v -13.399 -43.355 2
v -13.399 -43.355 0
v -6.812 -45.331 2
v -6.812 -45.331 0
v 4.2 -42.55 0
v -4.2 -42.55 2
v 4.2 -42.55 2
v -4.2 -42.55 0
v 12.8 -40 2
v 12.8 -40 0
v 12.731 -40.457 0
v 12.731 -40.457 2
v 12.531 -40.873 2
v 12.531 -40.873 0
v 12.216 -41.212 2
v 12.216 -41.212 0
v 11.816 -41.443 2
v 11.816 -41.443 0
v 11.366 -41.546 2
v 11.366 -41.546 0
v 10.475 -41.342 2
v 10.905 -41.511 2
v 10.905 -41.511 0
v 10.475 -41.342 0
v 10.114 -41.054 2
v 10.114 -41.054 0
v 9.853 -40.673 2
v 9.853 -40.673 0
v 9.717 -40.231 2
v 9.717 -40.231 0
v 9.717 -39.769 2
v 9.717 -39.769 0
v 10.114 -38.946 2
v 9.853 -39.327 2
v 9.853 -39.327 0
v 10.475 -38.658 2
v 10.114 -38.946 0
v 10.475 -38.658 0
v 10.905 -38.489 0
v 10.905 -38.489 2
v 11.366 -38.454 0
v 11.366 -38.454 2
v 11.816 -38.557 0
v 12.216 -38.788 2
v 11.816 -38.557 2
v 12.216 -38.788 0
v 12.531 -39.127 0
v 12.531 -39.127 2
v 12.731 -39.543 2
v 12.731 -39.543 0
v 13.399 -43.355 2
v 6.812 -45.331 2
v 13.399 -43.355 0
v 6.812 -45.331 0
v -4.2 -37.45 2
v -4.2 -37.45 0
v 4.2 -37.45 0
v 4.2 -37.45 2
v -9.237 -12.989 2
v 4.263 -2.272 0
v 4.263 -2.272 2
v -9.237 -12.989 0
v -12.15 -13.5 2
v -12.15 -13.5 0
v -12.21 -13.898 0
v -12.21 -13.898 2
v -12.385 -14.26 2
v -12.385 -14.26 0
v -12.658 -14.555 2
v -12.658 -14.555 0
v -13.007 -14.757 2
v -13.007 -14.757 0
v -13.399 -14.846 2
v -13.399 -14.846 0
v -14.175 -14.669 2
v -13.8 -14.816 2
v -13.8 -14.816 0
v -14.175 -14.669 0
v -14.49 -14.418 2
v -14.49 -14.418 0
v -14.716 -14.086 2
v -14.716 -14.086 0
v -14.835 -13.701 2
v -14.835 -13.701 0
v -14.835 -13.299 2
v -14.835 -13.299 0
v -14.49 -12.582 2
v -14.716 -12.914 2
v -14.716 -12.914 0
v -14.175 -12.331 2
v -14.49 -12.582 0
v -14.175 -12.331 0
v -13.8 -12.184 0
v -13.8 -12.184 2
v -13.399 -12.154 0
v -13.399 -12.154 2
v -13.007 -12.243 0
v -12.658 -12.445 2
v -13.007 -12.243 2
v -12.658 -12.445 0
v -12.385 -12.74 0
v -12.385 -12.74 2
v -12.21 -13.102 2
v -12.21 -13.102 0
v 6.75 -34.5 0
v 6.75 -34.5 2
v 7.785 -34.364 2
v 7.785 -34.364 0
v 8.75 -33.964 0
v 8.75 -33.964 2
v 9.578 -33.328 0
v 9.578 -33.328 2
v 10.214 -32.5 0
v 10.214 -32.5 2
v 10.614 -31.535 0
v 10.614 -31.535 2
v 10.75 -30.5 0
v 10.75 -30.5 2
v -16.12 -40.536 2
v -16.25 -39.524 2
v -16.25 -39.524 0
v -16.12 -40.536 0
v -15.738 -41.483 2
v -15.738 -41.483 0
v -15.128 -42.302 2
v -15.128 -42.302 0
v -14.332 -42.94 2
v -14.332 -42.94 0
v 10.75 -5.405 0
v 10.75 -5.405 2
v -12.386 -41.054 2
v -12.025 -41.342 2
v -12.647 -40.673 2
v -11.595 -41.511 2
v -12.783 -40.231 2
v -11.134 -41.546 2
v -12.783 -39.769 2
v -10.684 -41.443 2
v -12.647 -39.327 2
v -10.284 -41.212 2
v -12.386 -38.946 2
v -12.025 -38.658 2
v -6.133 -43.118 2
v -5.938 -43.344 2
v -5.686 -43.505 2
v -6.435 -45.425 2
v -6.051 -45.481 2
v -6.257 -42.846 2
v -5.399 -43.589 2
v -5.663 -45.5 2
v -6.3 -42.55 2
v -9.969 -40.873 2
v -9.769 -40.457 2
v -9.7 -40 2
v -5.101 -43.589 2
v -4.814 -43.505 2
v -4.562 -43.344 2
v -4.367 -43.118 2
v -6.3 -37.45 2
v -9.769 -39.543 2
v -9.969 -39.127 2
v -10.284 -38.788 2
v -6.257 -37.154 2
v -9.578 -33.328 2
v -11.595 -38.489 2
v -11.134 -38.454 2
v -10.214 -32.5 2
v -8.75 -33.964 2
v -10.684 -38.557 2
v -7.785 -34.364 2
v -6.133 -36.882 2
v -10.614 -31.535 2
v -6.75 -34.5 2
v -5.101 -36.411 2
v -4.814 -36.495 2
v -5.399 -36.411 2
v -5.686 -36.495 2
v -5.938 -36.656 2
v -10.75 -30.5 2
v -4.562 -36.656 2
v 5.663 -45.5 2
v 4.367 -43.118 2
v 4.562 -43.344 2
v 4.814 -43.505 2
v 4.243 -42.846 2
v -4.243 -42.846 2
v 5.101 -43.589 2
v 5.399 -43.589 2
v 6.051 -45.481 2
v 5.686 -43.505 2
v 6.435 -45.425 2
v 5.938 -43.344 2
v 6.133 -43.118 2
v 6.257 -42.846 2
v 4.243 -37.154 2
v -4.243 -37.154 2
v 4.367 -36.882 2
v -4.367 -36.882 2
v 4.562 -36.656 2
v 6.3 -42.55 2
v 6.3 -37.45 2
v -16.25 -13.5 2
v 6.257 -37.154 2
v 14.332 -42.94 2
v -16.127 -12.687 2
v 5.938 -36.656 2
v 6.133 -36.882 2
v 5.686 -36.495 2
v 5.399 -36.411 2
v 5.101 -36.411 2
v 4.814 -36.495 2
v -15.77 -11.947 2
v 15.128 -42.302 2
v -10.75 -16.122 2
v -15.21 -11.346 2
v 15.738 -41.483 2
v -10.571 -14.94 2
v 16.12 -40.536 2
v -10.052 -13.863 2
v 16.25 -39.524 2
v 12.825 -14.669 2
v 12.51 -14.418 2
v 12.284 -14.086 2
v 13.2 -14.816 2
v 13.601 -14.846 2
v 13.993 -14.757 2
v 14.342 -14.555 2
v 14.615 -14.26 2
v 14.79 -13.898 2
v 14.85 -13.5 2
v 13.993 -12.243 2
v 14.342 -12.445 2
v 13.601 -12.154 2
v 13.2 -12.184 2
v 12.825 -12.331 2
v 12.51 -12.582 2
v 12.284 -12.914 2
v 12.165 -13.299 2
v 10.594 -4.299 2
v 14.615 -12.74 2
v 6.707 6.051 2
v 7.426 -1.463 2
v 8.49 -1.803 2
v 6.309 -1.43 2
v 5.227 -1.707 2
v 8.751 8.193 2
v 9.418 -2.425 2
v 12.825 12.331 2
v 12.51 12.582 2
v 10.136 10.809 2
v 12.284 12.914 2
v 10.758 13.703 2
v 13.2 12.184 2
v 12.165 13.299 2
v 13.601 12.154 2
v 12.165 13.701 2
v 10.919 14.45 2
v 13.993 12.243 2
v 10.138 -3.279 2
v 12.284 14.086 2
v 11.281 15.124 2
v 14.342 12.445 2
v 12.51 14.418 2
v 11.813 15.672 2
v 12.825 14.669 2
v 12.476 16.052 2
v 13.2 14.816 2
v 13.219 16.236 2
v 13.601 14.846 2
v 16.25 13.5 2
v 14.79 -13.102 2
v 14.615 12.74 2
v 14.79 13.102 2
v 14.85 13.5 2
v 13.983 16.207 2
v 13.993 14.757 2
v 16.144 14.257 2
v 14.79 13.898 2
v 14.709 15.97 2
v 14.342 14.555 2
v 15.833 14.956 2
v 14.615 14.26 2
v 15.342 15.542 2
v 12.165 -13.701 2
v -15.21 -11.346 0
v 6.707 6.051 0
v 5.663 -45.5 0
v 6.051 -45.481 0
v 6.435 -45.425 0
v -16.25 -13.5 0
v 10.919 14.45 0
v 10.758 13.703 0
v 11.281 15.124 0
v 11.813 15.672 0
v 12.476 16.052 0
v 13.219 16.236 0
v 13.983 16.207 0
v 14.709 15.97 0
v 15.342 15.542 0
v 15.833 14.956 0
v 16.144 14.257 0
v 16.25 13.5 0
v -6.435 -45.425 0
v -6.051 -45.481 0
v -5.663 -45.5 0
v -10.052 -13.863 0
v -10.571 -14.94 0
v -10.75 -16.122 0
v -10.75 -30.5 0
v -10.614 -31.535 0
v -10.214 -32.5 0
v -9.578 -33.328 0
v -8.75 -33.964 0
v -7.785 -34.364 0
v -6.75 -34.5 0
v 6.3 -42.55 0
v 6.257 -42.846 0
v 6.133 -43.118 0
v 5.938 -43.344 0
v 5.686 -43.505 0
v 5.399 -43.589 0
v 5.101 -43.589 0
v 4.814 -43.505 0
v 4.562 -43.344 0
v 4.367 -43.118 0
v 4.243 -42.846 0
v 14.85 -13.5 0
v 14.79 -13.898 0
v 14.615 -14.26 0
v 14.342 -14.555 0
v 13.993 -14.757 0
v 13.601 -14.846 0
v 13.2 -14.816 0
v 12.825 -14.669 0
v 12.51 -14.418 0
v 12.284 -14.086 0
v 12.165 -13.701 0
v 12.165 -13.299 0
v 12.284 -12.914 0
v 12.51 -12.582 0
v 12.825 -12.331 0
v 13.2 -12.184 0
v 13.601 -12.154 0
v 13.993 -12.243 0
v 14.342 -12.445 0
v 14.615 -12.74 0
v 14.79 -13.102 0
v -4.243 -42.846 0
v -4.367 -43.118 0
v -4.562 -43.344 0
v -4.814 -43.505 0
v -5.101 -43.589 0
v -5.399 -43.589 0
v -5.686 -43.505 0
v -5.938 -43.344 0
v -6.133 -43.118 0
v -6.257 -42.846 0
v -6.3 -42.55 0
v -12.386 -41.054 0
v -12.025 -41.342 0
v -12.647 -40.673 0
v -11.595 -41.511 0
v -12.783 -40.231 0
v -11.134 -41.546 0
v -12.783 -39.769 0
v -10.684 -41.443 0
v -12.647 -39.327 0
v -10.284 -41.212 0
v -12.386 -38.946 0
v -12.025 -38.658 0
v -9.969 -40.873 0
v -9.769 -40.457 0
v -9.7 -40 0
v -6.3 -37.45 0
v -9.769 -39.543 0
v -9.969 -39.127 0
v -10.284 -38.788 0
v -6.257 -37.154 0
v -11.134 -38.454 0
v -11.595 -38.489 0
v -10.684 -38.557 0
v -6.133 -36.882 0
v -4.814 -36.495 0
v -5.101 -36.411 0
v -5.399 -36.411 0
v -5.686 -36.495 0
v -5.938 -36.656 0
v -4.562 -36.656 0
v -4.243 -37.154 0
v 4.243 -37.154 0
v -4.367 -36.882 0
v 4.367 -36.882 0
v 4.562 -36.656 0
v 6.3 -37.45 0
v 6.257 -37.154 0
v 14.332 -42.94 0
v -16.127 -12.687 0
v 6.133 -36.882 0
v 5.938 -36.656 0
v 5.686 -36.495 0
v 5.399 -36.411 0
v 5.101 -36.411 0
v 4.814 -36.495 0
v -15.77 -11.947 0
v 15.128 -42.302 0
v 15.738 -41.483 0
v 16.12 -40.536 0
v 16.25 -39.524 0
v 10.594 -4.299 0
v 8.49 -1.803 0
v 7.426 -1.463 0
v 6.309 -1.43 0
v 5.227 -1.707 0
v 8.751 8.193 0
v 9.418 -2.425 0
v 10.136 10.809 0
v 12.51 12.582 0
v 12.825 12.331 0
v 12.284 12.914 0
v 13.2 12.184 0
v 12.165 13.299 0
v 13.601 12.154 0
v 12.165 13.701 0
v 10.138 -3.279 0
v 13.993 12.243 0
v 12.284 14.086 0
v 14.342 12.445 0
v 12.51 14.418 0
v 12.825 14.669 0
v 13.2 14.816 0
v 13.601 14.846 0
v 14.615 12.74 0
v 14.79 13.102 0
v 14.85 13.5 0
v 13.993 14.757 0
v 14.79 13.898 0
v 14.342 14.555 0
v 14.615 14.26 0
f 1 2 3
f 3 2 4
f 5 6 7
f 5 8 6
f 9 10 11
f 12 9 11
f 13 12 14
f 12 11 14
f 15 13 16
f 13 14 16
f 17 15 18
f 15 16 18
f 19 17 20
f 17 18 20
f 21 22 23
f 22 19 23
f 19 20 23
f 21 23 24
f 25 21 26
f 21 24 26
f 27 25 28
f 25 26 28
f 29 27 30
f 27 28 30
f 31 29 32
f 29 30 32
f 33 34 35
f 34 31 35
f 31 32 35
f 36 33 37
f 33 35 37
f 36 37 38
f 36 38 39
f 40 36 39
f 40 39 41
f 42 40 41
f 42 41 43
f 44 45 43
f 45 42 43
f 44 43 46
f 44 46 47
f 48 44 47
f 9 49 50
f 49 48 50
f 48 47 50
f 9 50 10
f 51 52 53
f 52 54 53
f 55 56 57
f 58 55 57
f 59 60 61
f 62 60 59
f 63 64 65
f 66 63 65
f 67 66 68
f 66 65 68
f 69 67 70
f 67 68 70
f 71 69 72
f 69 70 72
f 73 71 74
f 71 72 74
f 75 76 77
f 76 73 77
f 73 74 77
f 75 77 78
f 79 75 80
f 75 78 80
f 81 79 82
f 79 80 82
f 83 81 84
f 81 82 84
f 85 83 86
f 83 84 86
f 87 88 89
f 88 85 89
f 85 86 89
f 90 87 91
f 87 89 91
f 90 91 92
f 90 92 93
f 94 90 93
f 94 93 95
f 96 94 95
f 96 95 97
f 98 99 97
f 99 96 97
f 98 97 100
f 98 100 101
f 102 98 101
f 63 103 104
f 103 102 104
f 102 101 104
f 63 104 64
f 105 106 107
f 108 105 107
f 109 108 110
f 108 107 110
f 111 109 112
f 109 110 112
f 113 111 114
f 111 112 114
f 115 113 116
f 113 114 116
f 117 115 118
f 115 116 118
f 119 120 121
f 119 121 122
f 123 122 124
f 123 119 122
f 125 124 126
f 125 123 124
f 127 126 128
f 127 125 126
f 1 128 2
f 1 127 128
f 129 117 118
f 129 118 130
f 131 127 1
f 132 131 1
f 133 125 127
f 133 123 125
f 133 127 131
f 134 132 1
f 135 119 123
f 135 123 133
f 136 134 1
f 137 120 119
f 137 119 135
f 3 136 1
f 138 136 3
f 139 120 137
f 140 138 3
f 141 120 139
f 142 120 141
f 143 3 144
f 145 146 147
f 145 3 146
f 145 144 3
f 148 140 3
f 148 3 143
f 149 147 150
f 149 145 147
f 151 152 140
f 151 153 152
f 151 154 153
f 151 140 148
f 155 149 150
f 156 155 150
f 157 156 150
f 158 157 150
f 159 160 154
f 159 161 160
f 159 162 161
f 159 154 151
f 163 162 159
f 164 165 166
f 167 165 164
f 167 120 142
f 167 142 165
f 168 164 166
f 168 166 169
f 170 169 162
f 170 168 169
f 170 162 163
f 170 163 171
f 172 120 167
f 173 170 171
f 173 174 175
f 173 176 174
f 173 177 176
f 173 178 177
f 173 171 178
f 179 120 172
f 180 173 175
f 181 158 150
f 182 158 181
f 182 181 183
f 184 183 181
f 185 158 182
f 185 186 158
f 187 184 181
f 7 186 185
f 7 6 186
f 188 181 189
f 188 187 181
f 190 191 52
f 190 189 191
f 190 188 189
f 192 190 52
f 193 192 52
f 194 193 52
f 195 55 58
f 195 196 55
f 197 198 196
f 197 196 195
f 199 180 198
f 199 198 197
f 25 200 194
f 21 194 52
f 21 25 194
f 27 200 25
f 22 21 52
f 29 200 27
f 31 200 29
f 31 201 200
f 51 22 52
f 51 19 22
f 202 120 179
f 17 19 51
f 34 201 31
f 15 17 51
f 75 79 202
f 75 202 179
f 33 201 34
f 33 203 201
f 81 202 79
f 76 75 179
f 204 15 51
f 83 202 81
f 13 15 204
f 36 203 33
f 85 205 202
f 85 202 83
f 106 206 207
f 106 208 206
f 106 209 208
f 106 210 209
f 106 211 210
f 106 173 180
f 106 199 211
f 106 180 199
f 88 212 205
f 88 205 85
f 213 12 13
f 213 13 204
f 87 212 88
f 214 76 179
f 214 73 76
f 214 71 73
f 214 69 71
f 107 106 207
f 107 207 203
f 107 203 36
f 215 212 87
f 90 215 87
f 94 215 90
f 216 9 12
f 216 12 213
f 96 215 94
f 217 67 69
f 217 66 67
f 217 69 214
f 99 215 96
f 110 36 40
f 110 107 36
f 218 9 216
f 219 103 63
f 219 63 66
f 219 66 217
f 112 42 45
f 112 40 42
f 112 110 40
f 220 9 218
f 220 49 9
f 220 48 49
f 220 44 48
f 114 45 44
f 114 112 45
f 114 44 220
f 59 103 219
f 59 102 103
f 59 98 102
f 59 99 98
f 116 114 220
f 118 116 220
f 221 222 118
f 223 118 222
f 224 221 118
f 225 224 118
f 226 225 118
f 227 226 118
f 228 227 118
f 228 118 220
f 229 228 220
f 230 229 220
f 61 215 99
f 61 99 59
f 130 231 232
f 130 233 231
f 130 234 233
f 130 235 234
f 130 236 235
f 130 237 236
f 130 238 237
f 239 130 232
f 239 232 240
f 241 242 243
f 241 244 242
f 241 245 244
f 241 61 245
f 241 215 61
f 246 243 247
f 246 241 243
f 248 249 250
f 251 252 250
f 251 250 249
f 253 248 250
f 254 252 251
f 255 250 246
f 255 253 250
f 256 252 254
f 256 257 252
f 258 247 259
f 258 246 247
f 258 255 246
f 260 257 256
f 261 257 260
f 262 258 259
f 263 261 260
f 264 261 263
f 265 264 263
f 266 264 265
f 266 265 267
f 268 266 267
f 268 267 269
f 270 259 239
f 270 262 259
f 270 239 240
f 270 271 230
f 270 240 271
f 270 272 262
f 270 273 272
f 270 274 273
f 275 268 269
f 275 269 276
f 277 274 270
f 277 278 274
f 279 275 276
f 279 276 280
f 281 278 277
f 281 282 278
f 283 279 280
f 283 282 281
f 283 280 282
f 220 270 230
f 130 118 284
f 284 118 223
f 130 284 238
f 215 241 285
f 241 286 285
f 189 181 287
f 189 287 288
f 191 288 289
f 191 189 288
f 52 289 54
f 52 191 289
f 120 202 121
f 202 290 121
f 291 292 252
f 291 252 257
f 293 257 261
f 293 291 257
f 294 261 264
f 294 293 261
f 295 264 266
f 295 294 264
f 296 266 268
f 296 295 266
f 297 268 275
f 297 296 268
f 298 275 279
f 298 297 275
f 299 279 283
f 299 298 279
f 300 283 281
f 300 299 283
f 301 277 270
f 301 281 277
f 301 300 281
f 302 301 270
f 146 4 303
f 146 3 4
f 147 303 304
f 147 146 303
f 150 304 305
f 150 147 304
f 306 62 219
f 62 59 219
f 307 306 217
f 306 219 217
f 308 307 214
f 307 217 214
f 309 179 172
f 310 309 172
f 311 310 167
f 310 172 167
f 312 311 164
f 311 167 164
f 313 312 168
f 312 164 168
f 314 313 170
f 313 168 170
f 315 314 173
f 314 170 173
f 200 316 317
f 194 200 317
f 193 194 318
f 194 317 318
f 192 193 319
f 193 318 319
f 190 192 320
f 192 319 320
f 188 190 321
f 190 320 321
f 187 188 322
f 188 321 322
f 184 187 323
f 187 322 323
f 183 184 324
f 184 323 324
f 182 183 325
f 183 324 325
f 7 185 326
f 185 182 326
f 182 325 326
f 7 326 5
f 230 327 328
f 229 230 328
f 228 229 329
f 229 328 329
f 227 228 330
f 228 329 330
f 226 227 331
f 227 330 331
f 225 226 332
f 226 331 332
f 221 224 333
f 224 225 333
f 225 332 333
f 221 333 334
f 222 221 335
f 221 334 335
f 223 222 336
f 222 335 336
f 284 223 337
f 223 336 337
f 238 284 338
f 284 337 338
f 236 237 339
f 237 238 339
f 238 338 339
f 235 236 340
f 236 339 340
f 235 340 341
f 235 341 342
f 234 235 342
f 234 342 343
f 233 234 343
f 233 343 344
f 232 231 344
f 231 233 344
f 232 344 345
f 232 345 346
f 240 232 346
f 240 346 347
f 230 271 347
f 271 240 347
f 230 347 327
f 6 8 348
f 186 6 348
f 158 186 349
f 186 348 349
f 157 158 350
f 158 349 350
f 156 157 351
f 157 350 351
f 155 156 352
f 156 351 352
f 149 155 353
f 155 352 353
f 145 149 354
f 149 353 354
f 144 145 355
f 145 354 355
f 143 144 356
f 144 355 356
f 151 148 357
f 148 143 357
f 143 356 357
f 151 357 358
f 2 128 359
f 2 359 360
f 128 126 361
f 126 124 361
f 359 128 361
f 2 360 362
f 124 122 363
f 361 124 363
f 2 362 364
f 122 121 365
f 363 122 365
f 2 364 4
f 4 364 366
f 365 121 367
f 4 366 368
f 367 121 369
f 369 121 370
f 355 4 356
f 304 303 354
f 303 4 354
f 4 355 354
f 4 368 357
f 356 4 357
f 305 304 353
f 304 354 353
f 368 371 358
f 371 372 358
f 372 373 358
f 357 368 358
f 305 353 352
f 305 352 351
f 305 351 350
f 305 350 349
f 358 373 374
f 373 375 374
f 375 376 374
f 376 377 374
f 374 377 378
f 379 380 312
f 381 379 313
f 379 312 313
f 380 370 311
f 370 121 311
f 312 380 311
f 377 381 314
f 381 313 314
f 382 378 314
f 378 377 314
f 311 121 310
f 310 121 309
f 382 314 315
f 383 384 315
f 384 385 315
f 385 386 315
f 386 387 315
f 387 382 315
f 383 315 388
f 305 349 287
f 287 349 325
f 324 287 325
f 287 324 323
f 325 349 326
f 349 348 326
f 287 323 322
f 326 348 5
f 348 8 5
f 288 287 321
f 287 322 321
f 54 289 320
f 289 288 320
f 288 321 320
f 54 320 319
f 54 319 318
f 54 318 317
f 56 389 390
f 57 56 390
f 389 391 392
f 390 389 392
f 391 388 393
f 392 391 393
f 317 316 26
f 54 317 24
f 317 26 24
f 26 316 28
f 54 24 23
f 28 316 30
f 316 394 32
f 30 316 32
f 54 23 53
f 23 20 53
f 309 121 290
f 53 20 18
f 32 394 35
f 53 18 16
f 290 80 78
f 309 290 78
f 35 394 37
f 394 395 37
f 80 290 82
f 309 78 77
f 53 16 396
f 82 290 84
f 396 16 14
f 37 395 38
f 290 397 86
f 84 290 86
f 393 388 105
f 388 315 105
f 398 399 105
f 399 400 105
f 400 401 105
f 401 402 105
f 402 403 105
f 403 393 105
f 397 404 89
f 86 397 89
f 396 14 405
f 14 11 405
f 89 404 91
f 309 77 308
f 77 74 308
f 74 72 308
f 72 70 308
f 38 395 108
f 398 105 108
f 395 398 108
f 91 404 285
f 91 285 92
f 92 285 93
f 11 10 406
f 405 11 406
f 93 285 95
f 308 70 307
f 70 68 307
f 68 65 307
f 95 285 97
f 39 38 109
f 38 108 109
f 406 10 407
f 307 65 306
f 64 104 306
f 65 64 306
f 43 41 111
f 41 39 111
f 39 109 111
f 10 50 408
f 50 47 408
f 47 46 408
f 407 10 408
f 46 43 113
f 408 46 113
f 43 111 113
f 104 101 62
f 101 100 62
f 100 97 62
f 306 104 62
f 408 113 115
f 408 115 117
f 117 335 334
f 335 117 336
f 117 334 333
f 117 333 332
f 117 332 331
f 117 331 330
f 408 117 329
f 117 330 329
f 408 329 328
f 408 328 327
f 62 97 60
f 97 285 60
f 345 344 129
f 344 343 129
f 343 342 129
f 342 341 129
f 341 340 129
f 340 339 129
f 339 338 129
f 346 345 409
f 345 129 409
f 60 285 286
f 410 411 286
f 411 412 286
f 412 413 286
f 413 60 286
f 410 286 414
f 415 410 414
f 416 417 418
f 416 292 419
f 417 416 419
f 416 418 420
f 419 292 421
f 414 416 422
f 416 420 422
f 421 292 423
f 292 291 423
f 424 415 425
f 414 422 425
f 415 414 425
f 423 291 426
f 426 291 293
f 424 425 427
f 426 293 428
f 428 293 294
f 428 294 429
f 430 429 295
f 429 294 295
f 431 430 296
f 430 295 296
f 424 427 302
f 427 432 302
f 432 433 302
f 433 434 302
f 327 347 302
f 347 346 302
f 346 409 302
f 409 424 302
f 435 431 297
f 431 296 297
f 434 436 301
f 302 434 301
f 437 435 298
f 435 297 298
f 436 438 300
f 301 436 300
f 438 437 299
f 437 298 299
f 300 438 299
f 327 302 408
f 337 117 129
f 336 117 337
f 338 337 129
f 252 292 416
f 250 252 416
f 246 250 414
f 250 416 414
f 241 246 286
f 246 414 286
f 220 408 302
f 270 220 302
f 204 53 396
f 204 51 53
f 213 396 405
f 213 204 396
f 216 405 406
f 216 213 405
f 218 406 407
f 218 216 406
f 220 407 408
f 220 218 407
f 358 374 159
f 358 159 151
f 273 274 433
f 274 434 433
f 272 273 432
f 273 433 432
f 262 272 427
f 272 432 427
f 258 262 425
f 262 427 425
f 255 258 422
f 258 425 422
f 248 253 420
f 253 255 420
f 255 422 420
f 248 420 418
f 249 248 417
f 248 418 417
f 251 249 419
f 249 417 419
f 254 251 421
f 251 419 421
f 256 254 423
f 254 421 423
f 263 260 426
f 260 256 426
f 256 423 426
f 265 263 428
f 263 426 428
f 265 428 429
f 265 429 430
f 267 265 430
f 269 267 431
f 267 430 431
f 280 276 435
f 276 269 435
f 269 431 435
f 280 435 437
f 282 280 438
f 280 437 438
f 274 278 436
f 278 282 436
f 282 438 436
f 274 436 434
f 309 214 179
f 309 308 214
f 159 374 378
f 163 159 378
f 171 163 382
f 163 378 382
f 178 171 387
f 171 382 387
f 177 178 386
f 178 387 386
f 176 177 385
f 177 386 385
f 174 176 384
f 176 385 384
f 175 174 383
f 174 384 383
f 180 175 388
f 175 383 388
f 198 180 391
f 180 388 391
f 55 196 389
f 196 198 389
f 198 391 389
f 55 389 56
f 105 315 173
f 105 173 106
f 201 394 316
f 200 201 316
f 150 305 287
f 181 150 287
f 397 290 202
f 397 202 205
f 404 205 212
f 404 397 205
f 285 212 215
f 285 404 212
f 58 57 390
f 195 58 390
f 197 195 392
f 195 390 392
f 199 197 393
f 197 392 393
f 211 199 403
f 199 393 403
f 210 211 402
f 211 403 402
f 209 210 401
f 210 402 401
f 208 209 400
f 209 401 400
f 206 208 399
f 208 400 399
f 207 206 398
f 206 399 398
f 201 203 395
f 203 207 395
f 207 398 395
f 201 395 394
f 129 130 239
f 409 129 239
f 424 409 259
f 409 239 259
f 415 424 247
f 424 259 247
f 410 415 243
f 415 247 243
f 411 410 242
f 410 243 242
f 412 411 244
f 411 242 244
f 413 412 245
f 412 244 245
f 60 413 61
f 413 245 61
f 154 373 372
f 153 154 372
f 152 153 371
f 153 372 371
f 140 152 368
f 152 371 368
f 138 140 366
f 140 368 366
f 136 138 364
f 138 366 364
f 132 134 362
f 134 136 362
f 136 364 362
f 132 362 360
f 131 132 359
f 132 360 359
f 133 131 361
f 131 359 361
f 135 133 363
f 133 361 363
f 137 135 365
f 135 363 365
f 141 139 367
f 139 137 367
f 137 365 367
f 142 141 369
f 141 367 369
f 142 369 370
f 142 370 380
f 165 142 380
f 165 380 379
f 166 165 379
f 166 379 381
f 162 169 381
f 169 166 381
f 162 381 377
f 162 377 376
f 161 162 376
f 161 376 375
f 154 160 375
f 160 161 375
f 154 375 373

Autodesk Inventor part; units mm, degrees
ref_plane "YZ Plane" through (0, 0, 0) normal (1, 0, 0) x (0, 1, 0)
ref_plane "XZ Plane" through (0, 0, 0) normal (0, 1, 0) x (-1, 0, 0)
ref_plane "XY Plane" through (0, 0, 0) normal (0, 0, 1) x (1, 0, 0)
sketch "スケッチ1" plane through (0, 0, 0) normal (0, 0, 1) x (1, 0, 0)
  line L0 (-13.5, 13.5) -> (13.5, 13.5) construction
  line L1 (13.5, 13.5) -> (13.5, -13.5) construction
  line L2 (13.5, -13.5) -> (-13.5, -13.5) construction
  line L3 (-13.5, -13.5) -> (-13.5, 13.5) construction
  circle A0 centre (-13.5, 13.5) radius 1.35
  circle A1 centre (13.5, 13.5) radius 1.35
  circle A2 centre (-13.5, -13.5) radius 1.35
  circle A3 centre (13.5, -13.5) radius 1.35
  circle A4 centre (0, 14.5) radius 10.5 construction
  line L4 (-6.25, -37.5) -> (6.25, -37.5) construction
  line L5 (6.25, -37.5) -> (6.25, -42.5) construction
  line L6 (6.25, -42.5) -> (-6.25, -42.5) construction
  line L7 (-6.25, -42.5) -> (-6.25, -37.5) construction
  line L8 (-16.25, -37.5) -> (16.25, -37.5) construction
  line L9 (16.25, -37.5) -> (16.25, -42.5) construction
  line L10 (16.25, -42.5) -> (-16.25, -42.5) construction
  line L11 (-16.25, -42.5) -> (-16.25, -37.5) construction
  line L12 (-6.3, -37.45) -> (6.3, -37.45) construction
  line L13 (6.3, -37.45) -> (6.3, -42.55) construction
  line L14 (6.3, -42.55) -> (-6.3, -42.55) construction
  line L15 (-6.3, -42.55) -> (-6.3, -37.45) construction
  circle A5 centre (-5.25, -37.45) radius 1.05 construction
  circle A6 centre (-11.25, -40) radius 1.55
  circle A7 centre (11.25, -40) radius 1.55
  line L16 (0, 0) -> (0, -13.5) construction
  line L17 (-6.3, -37.45) -> (-6.3, -42.55)
  line L18 (6.3, -40) -> (-6.3, -40) construction
  line L19 (0, -37.5) -> (0, -42.55) construction
  arc A8 (-4.2, -37.45) -> (-6.3, -37.45) centre (-5.25, -37.45) ccw
  arc A9 (-6.3, -42.55) -> (-4.2, -42.55) centre (-5.25, -42.55) ccw
  line L20 (-4.2, -37.45) -> (4.2, -37.45)
  line L21 (-4.2, -42.55) -> (4.2, -42.55)
  arc A10 (6.3, -37.45) -> (4.2, -37.45) centre (5.25, -37.45) ccw
  arc A11 (4.2, -42.55) -> (6.3, -42.55) centre (5.25, -42.55) ccw
  line L22 (6.3, -37.45) -> (6.3, -42.55)
  circle A12 centre (-13.5, -13.5) radius 2.75 construction
  circle A13 centre (13.5, 13.5) radius 2.75 construction
  line L23 (-16.25, -13.5) -> (-16.25, -42.5)
  line L24 (-16.25, -42.5) -> (-6.25, -45.5)
  line L25 (-6.25, -45.5) -> (6.25, -45.5)
  line L26 (6.25, -45.5) -> (16.25, -42.5)
  line L27 (16.25, -42.5) -> (16.25, 13.5)
  arc A14 (16.25, 13.5) -> (10.7575, 13.7031) centre (13.5, 13.5) ccw
  arc A15 (6.7066, 6.0513) -> (10.7575, 13.7031) centre (0, 14.5) ccw
  line L28 (6.7066, 6.0513) -> (-15.2098, -11.3461)
  arc A16 (-15.2098, -11.3461) -> (-16.25, -13.5) centre (-13.5, -13.5) ccw
  line L29 (-10.75, -14.1897) -> (-10.75, -34.5)
  line L30 (-10.75, -34.5) -> (10.75, -34.5)
  line L31 (10.75, -34.5) -> (10.75, 2.8772)
  line L32 (10.75, 2.8772) -> (-10.75, -14.1897)
  point P0 (0, 13.5)
  point P1 (13.5, 0)
  point P2 (-16.25, -40)
  dimension "d23" = 2.1
  dimension "d0" = 27
  dimension "d3" = 27
  dimension "d6" = 27
  dimension "d9" = 2.7
  dimension "d10" = 21
  dimension "d11" = 1
  dimension "d12" = 24
  dimension "d13" = 5
  dimension "d16" = 32.5
  dimension "d20" = 10
  dimension "d22" = 0.05
  dimension "d24" = 5
  dimension "d26" = 3.1
  dimension "d31" = 5.5
  dimension "d32" = 3
  dimension "d33" = 5
  dimension "d34" = 3
extrude "押し出し1" add sketch "スケッチ1" along normal blind 2 contours A16 L28 A15 A14 L27 L26 L25 L24 L23
fillet "フィレット1" radius 4 8 edges at (10.75, 2.8772, 1) (-10.75, -34.5, 1) (-10.75, -14.1897, 1) (10.75, -34.5, 1) (16.25, -42.5, 1) (-16.25, -42.5, 1) (-6.25, -45.5, 1) (6.25, -45.5, 1)
equation "\"d3\" = d0"
equation "\"d6\" = d0"
equation "\"d16\" = d0_1"
equation "\"d20\" = d3_1"
equation "\"d24\" = d17"
equation "\"d34\" = d32"
equation "\"d0_1\" = 32.5"
equation "\"d3_1\" = 10"
equation "\"d17\" = 5"
properties part number "上腕_サブフレーム_1_1" material "GFRP"
